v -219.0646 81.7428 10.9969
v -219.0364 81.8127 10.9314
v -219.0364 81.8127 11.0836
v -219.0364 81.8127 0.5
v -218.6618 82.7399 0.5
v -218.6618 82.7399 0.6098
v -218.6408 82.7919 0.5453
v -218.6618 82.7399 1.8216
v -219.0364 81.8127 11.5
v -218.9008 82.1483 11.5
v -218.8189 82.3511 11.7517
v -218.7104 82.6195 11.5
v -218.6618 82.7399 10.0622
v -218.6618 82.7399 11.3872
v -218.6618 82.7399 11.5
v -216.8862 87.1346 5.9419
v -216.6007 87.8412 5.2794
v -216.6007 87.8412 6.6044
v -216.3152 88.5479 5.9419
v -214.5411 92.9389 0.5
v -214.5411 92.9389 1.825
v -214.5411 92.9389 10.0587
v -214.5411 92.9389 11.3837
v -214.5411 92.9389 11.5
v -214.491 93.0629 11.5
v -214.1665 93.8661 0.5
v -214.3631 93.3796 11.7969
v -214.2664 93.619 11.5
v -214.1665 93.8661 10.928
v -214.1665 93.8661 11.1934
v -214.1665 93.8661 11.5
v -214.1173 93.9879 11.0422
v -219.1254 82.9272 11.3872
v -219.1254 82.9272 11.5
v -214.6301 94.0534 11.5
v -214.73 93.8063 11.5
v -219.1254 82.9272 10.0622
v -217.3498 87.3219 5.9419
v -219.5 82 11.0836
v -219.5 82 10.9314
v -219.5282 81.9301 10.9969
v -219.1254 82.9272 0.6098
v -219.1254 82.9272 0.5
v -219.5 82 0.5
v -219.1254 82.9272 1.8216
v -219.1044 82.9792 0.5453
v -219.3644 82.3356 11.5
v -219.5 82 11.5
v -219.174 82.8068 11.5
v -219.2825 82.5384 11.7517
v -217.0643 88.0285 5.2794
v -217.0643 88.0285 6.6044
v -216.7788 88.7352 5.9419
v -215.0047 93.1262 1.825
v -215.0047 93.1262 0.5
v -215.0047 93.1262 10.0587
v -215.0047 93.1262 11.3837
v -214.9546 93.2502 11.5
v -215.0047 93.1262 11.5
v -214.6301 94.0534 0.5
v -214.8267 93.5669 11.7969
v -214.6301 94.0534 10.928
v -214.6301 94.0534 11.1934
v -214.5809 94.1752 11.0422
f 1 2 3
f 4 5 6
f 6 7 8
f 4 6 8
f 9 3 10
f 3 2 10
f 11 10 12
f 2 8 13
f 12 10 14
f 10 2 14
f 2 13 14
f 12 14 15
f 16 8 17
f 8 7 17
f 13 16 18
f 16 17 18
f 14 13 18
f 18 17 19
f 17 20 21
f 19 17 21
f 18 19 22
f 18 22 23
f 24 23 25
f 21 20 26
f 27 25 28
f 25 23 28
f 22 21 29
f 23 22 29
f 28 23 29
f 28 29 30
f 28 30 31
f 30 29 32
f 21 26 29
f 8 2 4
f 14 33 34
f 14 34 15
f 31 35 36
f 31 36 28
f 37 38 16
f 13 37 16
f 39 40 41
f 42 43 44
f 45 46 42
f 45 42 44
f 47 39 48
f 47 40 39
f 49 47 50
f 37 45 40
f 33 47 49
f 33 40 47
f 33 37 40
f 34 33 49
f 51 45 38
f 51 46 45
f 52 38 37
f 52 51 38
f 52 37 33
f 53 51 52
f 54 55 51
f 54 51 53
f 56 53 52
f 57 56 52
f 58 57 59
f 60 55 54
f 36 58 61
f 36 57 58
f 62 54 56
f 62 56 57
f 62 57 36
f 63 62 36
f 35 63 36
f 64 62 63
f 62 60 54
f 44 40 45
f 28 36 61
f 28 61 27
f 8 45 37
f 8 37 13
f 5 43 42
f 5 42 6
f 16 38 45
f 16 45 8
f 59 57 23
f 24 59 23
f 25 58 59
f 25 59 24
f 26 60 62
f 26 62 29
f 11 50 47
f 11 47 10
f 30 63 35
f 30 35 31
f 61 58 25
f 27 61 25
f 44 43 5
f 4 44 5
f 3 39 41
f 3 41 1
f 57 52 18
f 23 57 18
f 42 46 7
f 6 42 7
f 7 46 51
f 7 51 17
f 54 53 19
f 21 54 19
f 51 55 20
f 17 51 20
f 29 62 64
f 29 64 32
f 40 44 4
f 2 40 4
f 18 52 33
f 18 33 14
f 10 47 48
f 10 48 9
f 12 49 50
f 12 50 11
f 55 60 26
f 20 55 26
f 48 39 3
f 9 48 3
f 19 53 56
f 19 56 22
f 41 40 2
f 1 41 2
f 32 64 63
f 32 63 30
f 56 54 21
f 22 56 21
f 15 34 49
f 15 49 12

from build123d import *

# Parameters (mm, degrees)
BOX216_W                  = 0.5
BOX216_H                  = 1
BOX216_DEPTH              = 11
BOX217_W                  = 0.5
BOX217_H                  = 1
BOX217_DEPTH              = 16
BOX217_ROLL_ANGLE         = 49
BOX218_W                  = 0.5
BOX218_H                  = 1
BOX218_DEPTH              = 16
BOX218_ROLL_ANGLE         = -49
BOX215_W                  = 0.5
BOX215_H                  = 1
BOX215_DEPTH              = 11
FUSION016_PLACEMENT_ANGLE = -22


with BuildPart() as cubo216:
    # Box216 → Box216 (new body)
    with BuildSketch(Plane(origin=(0, 12, 0.5), x_dir=(1, 0, 0), z_dir=(0, 0, 1))):
        with Locations((0.25, 0.5)):
            Rectangle(BOX216_W, BOX216_H)
    extrude(amount=BOX216_DEPTH)


with BuildPart() as cubo217:
    # Box217 → Box217 (new body)
    with BuildSketch(Plane.XY):
        with Locations((0.25, 0.5)):
            Rectangle(BOX217_W, BOX217_H)
    extrude(amount=BOX217_DEPTH)


with BuildPart() as cubo217_1:
    # Box217 roll: moved
    add(cubo217.part.rotate(Axis((0, 0, 0), (1, 0, 0)), BOX217_ROLL_ANGLE))


with BuildPart() as cubo217_2:
    # Box217 placement: moved
    add(cubo217_1.part.moved(Location((0, 12, 0.5))))


with BuildPart() as cubo218:
    # Box218 → Box218 (new body)
    with BuildSketch(Plane.XY):
        with Locations((0.25, 0.5)):
            Rectangle(BOX218_W, BOX218_H)
    extrude(amount=BOX218_DEPTH)


with BuildPart() as cubo218_1:
    # Box218 roll: moved
    add(cubo218.part.rotate(Axis((0, 0, 0), (1, 0, 0)), BOX218_ROLL_ANGLE))


with BuildPart() as cubo218_2:
    # Box218 placement: moved
    add(cubo218_1.part.moved(Location((0, 0.4, 1.3))))


with BuildPart() as fusion016:
    # Box215 → Box215 (new body)
    with BuildSketch(Plane.XY.offset(0.5)):
        with Locations((0.25, 0.5)):
            Rectangle(BOX215_W, BOX215_H)
    extrude(amount=BOX215_DEPTH)

    # Fusion016: union Cubo216, Cubo217, Cubo218
    add(cubo216.part)
    add(cubo217_2.part)
    add(cubo218_2.part)


with BuildPart() as fusion016_1:
    # Fusion016 placement: moved
    add(fusion016.part.moved(Location((-219.5, 82, 0))).rotate(Axis((-219.5, 82, 0), (0, 0, 1)), FUSION016_PLACEMENT_ANGLE))


solid = fusion016_1.part
